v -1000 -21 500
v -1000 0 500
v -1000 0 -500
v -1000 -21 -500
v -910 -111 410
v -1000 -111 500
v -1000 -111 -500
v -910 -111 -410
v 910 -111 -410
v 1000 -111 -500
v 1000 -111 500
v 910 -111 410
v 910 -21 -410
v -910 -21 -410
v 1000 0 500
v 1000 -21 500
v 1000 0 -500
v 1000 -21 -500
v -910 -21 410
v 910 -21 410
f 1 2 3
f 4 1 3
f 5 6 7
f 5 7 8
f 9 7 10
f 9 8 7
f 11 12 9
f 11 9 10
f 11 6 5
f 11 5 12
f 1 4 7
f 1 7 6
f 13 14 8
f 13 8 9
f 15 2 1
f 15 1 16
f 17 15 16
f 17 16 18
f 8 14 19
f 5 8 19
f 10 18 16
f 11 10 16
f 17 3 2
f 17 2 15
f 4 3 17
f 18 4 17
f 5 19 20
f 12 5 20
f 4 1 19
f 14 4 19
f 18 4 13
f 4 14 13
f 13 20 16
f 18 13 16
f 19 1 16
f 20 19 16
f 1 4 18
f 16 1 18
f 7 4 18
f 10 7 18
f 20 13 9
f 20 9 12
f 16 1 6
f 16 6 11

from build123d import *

# Parameters (mm, degrees)
SKIZZE1_W                       = 2000
SKIZZE1_H                       = 1000
AUFSATZ_LINEAR_AUSTRAGEN2_DEPTH = 21
SKIZZE3_W                       = 2000
SKIZZE3_H                       = 1000
SKIZZE3_W_2                     = 1820
SKIZZE3_H_2                     = 820
AUFSATZ_LINEAR_AUSTRAGEN3_DEPTH = 90


with BuildPart() as part:
    # Skizze1 → Aufsatz-Linear austragen2 (new body)
    with BuildSketch(Plane(origin=(0, 0, 0), x_dir=(1, 0, 0), z_dir=(0, 1, 0))):
        Rectangle(SKIZZE1_W, SKIZZE1_H)
    extrude(amount=-AUFSATZ_LINEAR_AUSTRAGEN2_DEPTH)


with BuildPart() as body_2:
    # Skizze3 → Aufsatz-Linear austragen3 (new body)
    with BuildSketch(Plane.XZ.offset(21)):
        Rectangle(SKIZZE3_W, SKIZZE3_H)
        Rectangle(SKIZZE3_W_2, SKIZZE3_H_2, mode=Mode.SUBTRACT)
    extrude(amount=AUFSATZ_LINEAR_AUSTRAGEN3_DEPTH)


solid = Compound([part.part, body_2.part])
